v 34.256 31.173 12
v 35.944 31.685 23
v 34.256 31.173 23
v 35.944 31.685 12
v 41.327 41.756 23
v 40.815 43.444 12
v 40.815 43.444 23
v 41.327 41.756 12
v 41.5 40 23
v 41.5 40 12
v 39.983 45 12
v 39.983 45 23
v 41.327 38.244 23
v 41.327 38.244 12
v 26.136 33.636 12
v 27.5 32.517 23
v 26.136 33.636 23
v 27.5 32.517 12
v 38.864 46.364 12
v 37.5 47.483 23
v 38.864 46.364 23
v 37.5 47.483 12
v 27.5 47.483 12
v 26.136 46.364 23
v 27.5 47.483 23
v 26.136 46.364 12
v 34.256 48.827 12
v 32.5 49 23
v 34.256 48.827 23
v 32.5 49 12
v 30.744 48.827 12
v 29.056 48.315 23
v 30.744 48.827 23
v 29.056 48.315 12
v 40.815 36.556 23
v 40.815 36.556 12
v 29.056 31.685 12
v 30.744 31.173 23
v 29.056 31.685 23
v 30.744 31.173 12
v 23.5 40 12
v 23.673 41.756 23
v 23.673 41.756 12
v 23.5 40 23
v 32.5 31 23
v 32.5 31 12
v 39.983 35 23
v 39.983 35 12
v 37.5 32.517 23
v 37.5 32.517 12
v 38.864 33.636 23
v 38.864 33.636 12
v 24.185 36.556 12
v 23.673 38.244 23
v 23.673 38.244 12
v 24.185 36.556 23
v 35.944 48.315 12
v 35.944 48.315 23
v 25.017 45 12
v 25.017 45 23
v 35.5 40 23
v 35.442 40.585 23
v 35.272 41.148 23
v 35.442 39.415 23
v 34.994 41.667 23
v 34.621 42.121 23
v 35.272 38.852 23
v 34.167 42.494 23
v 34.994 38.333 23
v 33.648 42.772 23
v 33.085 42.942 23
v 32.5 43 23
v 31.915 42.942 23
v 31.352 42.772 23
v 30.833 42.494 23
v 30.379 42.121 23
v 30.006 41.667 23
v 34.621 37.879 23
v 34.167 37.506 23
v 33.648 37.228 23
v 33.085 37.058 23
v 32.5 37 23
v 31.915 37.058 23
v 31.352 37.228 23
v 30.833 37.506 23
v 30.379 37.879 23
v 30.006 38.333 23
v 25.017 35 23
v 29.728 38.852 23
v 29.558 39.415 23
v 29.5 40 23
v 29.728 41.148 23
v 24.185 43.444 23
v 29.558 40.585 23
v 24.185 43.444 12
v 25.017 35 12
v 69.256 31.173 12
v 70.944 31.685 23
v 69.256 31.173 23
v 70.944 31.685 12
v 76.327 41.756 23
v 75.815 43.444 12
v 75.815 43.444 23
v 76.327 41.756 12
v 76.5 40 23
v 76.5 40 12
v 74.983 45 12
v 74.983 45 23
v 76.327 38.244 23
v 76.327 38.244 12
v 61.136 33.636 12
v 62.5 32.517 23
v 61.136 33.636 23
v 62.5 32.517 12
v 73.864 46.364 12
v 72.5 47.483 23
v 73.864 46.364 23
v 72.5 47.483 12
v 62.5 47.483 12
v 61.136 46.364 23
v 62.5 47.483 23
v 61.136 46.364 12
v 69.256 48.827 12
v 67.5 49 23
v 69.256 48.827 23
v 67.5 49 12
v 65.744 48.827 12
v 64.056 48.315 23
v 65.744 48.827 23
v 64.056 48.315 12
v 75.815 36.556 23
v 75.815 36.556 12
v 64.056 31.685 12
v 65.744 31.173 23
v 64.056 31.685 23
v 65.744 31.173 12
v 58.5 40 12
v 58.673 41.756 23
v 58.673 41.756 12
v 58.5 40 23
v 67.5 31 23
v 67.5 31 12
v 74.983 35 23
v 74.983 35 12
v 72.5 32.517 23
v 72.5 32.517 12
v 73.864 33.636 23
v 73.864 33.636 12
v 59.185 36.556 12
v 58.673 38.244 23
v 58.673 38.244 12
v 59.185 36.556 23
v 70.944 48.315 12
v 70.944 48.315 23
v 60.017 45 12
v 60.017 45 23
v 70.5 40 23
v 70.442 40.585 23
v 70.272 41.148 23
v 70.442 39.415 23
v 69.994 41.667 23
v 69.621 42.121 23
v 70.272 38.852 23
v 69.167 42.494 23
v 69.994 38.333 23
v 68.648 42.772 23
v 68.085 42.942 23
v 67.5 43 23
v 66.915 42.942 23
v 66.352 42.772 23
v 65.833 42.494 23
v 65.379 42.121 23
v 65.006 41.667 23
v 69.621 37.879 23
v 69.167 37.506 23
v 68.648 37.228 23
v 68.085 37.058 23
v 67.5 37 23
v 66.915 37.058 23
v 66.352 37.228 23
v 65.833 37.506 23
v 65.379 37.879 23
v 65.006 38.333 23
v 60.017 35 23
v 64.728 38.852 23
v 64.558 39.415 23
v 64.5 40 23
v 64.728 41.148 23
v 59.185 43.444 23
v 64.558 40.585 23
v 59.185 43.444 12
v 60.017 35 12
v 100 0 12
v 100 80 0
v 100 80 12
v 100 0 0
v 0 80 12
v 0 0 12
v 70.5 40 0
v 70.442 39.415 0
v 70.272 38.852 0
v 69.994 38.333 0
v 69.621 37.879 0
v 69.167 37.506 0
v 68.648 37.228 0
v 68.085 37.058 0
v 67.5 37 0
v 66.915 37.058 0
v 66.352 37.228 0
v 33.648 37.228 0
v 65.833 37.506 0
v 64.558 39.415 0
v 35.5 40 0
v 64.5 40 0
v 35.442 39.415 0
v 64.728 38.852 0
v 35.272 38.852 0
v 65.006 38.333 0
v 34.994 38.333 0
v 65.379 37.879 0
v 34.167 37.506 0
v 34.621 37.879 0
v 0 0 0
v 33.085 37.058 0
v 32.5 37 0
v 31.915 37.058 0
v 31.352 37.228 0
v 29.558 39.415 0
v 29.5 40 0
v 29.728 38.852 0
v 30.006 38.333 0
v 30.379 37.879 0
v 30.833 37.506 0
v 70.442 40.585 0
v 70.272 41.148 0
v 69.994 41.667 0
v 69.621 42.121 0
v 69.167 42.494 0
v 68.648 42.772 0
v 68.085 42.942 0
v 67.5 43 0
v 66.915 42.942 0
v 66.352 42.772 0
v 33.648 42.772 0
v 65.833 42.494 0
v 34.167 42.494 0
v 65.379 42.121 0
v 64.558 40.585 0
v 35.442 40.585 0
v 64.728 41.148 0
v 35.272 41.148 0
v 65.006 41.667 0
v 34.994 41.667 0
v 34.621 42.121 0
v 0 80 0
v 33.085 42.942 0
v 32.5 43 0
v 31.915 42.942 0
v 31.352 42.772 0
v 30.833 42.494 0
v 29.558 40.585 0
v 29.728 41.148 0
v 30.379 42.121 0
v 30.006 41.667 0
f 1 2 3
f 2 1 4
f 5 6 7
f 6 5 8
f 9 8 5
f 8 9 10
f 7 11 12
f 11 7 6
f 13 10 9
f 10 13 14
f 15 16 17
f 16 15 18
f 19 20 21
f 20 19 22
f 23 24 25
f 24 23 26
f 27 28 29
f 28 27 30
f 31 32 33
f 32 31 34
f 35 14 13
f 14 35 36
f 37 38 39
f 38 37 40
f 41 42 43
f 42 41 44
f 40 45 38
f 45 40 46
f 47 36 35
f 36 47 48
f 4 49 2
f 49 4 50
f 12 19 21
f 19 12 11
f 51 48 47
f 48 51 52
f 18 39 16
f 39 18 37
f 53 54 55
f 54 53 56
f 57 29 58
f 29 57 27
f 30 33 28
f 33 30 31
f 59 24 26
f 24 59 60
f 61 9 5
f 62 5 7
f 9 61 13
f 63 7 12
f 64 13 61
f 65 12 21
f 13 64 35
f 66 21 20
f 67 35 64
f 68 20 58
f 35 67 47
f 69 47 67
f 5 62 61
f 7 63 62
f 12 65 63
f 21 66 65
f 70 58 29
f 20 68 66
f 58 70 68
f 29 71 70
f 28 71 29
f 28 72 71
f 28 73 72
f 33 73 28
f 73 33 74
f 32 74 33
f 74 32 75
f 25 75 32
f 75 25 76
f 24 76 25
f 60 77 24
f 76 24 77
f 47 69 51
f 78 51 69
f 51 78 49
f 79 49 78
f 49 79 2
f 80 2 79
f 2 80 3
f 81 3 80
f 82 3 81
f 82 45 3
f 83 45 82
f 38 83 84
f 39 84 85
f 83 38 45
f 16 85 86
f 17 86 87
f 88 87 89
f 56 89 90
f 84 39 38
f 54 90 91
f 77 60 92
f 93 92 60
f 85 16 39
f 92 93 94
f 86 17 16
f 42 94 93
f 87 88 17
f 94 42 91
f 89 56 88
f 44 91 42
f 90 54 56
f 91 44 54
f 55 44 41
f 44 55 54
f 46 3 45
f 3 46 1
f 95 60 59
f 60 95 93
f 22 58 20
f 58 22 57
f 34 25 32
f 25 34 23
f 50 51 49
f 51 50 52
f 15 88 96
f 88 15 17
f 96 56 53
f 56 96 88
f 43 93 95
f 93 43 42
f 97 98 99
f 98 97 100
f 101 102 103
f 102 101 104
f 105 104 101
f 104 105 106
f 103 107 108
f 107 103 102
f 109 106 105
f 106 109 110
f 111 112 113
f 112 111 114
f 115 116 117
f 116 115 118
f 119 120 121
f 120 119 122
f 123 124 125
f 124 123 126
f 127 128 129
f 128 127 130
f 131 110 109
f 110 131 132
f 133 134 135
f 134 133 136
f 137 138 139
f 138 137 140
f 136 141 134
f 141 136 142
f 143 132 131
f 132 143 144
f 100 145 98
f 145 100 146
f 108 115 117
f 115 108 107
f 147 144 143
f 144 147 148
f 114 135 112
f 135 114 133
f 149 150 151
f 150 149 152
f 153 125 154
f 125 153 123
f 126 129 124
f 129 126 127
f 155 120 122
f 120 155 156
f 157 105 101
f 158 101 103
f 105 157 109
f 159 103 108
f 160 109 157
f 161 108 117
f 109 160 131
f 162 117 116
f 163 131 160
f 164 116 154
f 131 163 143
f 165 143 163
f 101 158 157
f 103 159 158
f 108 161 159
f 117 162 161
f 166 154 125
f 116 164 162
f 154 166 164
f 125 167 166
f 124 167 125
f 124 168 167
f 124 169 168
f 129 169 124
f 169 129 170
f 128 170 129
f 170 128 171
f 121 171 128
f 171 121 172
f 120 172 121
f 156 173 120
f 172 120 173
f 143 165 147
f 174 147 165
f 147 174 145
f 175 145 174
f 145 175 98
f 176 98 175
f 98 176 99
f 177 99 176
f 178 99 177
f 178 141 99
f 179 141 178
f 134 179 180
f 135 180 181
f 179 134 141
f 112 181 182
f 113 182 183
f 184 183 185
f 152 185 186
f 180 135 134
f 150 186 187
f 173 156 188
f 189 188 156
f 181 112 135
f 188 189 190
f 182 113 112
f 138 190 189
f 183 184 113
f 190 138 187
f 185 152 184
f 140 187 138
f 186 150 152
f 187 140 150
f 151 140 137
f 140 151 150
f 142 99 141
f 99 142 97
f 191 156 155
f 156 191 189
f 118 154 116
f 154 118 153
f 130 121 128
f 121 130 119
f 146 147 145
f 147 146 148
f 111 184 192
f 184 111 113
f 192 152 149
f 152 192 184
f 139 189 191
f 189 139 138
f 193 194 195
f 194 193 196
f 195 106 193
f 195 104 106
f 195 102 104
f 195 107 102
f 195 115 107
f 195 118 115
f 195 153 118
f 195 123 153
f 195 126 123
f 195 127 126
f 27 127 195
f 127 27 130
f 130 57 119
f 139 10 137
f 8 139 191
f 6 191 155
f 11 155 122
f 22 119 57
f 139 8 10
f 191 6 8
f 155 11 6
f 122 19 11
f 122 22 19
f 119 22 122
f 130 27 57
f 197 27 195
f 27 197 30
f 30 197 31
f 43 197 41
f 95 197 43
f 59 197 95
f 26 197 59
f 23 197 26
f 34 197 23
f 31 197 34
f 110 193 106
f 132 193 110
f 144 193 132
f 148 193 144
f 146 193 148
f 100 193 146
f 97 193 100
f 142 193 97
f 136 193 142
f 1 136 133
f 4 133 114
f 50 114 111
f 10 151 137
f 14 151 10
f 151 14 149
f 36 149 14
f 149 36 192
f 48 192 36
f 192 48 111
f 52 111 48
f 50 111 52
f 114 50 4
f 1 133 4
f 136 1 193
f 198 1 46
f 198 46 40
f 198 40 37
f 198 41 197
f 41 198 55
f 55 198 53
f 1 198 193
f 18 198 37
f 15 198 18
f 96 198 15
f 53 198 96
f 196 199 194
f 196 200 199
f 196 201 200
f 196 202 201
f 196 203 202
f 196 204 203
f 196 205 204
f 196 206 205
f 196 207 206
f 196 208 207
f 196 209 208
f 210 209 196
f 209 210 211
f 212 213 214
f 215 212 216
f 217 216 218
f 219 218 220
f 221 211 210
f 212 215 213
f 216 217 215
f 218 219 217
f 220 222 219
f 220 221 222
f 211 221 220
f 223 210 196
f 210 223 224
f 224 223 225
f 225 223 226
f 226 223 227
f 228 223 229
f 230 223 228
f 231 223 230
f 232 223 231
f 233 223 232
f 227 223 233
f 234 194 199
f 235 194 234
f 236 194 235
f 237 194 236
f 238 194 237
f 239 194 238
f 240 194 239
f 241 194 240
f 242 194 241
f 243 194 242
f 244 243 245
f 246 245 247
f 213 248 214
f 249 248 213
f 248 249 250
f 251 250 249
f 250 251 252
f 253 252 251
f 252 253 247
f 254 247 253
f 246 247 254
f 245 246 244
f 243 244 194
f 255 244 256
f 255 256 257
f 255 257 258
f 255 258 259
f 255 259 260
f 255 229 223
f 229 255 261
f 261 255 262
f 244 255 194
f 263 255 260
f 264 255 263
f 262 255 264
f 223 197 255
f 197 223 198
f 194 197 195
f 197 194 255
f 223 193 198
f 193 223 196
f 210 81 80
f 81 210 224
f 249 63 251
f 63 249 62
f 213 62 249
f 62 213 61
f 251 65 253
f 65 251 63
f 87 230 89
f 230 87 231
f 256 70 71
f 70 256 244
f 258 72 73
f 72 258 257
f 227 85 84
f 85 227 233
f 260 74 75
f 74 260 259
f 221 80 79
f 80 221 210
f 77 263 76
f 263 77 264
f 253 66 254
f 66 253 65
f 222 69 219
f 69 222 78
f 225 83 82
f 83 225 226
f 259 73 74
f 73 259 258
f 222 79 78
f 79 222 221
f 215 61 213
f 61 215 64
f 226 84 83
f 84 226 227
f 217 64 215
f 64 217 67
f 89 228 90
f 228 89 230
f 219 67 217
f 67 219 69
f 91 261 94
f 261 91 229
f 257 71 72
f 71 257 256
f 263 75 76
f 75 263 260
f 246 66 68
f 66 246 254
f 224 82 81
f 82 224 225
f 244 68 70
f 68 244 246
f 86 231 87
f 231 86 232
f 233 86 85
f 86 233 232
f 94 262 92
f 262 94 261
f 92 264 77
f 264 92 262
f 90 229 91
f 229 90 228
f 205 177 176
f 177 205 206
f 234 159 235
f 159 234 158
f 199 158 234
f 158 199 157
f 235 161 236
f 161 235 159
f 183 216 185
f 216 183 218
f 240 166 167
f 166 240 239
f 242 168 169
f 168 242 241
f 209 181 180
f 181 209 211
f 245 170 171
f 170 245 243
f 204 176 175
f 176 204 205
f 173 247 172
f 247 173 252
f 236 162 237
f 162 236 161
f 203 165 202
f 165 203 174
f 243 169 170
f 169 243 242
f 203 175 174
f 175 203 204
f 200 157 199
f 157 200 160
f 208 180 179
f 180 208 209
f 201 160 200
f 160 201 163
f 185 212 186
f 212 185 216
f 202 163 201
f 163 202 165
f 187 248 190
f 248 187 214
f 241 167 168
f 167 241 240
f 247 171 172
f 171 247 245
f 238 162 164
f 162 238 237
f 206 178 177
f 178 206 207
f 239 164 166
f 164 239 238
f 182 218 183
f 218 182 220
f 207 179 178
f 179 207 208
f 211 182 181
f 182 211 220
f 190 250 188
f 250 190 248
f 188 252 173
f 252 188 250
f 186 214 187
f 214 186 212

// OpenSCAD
$fn = 32;

// ----------------------------------------------------------------------
// Drill jig: two_boss jig
// ----------------------------------------------------------------------

// --- parameters (mm) ---
plate_l = 100;            // plate length, X
plate_w = 80;             // plate width, Y
plate_t = 12;             // plate thickness
boss_d = 18;              // guide boss diameter
boss_h = 12;              // boss height above the plate
guide_d = 6;              // guide hole diameter
boss_pitch = 35;          // boss pitch
fit_tol = 0.05;           // tolerance for press fits, mm
free_tol = 0.3;           // tolerance for clearance fits, mm

n_boss = 2;  // guide bosses
boss_x0 = (plate_l - (n_boss - 1) * boss_pitch) / 2;  // first boss X
boss_top = plate_t - 1 + boss_h;  // boss crown height
total_h = boss_top;  // overall height

difference() {
  union() {
  cube([plate_l, plate_w, plate_t]);
  for (i = [0 : n_boss - 1])
    translate([boss_x0 + i * boss_pitch, plate_w / 2, plate_t - 1])
      cylinder(h = boss_h, d = boss_d);
  }
  for (i = [0 : n_boss - 1])
    translate([boss_x0 + i * boss_pitch, plate_w / 2, -1])
      cylinder(h = plate_t + boss_h, d = guide_d);
}
